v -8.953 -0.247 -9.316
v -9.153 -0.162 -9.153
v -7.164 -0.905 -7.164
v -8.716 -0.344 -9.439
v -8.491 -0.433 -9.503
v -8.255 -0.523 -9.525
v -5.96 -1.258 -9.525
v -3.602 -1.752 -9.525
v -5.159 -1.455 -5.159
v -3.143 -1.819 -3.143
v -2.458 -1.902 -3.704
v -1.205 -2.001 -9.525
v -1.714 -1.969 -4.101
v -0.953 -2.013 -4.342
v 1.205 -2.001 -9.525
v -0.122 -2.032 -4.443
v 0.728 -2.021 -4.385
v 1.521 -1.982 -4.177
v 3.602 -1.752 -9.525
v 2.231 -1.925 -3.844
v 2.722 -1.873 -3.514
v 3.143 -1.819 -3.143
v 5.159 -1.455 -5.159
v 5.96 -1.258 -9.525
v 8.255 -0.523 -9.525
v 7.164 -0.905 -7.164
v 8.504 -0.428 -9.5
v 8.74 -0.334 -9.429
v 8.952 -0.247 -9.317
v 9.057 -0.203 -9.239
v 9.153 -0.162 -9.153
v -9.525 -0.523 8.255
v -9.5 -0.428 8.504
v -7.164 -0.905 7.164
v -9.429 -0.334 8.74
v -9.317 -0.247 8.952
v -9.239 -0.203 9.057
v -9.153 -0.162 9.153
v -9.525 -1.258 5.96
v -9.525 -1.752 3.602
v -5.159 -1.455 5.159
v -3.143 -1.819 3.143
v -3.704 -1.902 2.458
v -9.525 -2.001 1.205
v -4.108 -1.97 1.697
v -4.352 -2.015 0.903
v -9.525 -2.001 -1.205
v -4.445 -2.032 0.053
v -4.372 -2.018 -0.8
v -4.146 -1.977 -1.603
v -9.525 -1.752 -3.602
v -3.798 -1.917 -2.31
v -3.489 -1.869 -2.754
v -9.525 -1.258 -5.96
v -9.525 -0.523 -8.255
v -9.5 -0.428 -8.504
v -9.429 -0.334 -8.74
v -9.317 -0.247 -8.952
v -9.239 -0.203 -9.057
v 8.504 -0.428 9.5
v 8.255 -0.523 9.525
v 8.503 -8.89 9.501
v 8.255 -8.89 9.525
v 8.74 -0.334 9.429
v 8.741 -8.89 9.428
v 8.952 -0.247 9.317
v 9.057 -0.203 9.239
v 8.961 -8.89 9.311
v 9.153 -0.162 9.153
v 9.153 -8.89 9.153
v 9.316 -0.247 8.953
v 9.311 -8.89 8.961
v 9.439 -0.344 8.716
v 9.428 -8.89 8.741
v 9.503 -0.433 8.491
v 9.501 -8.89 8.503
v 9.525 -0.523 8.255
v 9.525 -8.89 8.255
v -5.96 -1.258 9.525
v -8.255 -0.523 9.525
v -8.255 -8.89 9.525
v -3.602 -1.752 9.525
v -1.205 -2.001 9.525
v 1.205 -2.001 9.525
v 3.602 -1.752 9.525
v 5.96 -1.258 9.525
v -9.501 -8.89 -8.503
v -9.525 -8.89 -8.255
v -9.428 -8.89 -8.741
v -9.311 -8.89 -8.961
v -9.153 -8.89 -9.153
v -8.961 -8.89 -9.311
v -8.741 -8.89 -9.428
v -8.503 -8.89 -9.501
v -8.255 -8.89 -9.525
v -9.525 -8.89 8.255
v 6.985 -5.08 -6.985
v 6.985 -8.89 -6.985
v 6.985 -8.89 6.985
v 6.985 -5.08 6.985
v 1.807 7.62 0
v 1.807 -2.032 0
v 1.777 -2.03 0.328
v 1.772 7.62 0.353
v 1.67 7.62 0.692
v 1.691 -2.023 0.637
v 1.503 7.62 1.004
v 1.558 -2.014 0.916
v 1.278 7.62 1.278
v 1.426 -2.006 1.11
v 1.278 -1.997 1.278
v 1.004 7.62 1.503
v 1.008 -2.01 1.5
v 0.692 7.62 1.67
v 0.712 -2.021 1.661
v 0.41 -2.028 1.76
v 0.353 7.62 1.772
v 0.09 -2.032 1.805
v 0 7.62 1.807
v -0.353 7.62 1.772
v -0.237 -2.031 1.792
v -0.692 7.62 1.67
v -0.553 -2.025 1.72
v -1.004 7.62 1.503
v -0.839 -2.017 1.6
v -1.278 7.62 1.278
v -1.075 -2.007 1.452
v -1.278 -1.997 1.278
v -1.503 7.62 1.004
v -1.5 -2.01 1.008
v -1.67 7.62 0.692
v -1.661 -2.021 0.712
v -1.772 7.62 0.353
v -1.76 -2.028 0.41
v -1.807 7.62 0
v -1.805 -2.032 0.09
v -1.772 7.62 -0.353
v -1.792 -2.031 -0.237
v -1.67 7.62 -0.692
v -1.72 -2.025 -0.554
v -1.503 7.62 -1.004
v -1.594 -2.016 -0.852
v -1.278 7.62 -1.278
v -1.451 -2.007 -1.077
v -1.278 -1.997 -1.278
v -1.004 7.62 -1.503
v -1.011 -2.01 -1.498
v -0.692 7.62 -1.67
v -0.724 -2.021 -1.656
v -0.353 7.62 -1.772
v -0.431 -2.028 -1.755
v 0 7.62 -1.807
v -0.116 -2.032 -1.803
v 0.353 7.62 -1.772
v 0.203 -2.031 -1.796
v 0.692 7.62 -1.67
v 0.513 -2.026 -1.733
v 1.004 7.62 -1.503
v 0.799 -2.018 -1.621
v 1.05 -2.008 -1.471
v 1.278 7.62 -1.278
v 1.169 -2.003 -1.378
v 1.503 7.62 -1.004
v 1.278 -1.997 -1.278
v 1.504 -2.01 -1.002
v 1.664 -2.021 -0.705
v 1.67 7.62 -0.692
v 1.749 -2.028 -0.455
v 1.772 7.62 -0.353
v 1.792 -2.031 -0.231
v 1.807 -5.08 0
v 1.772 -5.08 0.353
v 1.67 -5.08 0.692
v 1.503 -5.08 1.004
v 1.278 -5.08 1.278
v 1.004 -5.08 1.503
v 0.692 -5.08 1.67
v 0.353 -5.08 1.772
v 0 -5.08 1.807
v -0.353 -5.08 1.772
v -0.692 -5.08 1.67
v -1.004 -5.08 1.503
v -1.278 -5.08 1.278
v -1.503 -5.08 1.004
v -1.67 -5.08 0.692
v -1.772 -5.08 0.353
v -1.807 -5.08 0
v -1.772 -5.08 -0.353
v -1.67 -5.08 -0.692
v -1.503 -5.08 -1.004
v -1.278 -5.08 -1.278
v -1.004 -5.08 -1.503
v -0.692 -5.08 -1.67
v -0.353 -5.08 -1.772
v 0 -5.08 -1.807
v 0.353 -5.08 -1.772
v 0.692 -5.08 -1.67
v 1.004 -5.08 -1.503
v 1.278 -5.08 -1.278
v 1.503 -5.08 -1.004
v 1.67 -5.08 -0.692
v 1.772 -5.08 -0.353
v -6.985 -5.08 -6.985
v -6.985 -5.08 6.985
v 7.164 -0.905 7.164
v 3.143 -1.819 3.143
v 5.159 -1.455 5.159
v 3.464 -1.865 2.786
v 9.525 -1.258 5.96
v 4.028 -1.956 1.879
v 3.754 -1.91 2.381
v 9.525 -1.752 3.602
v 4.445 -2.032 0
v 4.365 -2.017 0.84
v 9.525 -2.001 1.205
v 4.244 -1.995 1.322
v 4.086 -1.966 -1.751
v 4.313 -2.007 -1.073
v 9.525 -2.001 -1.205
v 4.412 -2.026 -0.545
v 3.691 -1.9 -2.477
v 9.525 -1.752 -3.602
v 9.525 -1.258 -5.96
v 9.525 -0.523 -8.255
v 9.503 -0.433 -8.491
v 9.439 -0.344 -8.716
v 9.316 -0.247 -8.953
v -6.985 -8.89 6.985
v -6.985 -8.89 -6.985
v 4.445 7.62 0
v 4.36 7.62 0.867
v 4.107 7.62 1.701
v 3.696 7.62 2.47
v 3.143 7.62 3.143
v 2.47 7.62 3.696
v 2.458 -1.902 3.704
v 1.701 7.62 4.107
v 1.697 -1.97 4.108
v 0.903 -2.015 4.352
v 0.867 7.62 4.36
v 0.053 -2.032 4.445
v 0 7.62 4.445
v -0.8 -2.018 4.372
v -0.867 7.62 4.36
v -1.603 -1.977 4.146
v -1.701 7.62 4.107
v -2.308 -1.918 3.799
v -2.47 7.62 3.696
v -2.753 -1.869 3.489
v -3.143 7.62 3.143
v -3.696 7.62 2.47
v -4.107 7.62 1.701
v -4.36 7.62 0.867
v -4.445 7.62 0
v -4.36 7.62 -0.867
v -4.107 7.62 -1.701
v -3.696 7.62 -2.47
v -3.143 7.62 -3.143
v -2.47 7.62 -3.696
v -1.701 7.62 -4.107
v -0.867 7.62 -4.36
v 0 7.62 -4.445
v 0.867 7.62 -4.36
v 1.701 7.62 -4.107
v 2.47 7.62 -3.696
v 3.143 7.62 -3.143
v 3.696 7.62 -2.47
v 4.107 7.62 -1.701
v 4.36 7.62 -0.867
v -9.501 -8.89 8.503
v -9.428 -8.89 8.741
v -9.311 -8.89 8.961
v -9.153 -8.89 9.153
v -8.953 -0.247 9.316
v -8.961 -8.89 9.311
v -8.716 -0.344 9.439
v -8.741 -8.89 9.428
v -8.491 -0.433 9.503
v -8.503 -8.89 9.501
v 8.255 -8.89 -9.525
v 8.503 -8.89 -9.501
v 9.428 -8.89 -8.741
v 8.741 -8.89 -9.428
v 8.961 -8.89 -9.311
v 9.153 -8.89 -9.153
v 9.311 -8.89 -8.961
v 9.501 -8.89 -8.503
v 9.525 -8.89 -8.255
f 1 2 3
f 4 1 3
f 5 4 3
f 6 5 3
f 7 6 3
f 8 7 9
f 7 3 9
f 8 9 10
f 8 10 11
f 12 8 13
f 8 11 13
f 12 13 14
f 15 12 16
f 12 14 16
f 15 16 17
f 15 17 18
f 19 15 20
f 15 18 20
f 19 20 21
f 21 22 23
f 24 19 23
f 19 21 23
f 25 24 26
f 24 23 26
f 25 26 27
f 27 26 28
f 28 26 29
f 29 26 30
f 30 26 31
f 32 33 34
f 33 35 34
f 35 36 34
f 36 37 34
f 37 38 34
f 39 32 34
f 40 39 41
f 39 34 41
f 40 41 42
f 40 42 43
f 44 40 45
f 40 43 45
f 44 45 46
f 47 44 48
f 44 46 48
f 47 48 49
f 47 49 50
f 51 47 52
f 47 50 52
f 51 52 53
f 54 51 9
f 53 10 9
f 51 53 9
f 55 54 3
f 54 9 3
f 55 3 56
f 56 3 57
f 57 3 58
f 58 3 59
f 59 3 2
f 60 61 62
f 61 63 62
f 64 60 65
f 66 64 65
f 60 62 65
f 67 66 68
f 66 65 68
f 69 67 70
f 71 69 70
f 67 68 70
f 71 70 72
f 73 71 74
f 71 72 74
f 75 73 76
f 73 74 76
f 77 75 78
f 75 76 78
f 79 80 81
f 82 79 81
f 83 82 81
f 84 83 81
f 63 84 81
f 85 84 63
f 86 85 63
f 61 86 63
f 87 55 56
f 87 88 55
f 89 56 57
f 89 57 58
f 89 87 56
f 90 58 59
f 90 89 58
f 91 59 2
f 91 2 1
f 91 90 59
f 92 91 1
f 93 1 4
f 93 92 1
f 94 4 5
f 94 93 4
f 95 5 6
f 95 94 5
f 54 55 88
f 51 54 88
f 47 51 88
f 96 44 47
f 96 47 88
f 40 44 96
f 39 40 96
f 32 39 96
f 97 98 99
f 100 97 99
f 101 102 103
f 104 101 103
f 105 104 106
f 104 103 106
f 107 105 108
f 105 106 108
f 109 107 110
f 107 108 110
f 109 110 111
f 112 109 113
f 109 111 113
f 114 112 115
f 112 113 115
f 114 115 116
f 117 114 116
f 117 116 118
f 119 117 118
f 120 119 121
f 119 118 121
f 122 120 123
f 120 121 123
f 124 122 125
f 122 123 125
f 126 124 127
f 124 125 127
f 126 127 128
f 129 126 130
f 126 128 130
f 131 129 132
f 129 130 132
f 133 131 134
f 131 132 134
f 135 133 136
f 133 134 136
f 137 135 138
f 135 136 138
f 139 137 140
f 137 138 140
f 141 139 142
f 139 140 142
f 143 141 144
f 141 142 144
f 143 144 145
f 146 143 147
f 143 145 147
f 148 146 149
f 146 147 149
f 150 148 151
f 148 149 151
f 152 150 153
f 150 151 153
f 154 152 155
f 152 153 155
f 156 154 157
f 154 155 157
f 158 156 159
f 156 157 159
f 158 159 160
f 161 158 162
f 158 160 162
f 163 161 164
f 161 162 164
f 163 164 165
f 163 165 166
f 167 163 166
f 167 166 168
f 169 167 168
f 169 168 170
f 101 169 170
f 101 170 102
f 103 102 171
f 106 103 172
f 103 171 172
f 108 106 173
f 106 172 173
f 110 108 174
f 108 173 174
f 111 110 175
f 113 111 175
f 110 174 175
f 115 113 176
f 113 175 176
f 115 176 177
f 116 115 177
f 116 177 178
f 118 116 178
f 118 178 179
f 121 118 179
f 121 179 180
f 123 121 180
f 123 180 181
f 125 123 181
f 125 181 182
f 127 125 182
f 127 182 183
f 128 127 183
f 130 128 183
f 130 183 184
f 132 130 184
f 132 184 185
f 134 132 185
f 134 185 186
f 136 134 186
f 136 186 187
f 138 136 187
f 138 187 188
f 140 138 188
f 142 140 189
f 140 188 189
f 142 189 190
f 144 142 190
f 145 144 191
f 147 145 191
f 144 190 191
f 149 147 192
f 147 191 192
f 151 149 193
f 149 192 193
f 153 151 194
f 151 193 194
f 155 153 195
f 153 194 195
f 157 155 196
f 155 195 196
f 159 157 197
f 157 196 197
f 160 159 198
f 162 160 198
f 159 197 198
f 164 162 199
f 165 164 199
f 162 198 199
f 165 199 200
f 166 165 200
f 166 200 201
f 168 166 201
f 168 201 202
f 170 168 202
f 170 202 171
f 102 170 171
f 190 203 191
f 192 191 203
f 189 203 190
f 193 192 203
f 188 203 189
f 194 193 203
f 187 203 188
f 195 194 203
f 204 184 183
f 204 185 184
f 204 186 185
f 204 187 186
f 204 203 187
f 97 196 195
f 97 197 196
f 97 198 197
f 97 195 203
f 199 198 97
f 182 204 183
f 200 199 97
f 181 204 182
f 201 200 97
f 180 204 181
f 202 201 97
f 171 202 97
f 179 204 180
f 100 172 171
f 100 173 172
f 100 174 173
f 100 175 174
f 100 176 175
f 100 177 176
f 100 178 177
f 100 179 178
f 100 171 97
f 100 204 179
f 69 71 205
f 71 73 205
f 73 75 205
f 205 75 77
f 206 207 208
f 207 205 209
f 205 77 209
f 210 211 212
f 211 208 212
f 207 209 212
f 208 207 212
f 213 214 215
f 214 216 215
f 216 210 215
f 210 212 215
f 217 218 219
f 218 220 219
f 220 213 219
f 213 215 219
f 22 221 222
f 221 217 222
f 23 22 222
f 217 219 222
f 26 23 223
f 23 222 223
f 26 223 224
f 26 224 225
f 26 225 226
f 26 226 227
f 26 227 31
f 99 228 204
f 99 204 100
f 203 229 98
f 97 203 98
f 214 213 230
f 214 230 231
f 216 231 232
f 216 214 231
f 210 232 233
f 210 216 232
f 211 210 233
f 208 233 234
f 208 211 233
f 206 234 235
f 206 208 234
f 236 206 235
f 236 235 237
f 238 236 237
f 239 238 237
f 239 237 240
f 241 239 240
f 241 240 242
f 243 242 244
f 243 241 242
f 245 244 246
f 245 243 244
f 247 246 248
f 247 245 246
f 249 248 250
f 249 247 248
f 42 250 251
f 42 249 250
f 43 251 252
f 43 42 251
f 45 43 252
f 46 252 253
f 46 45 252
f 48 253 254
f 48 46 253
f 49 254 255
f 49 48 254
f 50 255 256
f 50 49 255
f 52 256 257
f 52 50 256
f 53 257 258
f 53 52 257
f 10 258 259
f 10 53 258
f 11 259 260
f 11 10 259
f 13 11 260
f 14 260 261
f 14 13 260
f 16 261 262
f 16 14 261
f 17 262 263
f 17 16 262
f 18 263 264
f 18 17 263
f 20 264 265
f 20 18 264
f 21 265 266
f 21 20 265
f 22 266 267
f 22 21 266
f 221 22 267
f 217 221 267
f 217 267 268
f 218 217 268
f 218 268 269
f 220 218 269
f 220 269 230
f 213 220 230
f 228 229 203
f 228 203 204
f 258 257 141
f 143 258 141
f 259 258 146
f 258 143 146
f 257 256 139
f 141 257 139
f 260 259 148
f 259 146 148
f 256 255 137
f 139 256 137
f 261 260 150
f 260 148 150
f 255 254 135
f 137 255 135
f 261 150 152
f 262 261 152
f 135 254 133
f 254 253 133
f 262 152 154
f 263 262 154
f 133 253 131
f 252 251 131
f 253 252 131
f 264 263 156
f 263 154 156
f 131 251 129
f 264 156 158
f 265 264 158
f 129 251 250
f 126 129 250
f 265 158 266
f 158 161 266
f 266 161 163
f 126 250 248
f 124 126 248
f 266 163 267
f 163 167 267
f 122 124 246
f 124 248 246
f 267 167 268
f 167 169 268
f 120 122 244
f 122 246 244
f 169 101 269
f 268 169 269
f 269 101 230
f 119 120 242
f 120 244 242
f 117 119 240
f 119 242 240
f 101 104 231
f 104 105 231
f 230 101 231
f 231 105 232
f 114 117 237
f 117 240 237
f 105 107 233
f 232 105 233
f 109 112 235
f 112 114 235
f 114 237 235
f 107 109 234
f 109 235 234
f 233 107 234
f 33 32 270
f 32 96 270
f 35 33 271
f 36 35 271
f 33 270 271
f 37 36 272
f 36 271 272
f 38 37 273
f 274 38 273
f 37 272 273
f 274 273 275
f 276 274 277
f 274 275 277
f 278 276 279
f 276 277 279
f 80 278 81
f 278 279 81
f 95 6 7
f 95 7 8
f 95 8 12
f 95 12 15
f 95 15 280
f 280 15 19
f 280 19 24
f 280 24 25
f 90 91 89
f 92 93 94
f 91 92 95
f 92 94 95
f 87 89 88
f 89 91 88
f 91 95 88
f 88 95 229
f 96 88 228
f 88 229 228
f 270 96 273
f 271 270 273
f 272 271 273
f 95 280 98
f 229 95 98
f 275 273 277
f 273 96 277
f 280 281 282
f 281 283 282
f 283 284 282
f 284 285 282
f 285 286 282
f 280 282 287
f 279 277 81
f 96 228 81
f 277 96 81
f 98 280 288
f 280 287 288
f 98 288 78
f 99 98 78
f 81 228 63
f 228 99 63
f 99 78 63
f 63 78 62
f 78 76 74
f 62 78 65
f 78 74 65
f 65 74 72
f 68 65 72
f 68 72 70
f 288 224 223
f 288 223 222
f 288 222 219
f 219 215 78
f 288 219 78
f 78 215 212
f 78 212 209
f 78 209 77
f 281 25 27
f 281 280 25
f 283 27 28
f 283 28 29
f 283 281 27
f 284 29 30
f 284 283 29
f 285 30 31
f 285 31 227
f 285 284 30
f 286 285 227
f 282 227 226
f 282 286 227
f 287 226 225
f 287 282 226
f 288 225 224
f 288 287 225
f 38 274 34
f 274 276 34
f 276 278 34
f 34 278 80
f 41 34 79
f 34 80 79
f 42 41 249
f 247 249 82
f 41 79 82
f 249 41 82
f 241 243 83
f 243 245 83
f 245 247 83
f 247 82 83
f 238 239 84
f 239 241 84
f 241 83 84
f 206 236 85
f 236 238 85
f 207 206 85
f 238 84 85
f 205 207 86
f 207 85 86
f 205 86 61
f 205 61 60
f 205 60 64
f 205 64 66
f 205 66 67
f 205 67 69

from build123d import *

# Parameters (mm, degrees)
F0_W      = 19.05
F0_H      = 19.05
F1_DEPTH  = 11.43
F3_DEPTH  = 19.051
F5_DEPTH  = 19.051
F6_R      = 4.445
F6_R_2    = 1.807104104
F7_DEPTH  = 19.05
F8_DEPTH  = 19.0510001
F9_W      = 2.54
F9_H      = 19.05
F10_DEPTH = 19.0510001
F11_W     = 13.97
F11_H     = 13.97
F11_R     = 4.445
F12_DEPTH = 6.35
F13_R     = 1.27


with BuildPart() as f1:
    # F0 (on Front) → F1 (new body)
    with BuildSketch(Plane.XZ):
        Rectangle(F0_W, F0_H)
    extrude(amount=F1_DEPTH)

    # F2 (on face) → F3 (cut, through all)
    with BuildSketch(Plane.YZ.offset(9.525)):
        with BuildLine():
            Line((0, -9.525), (0, 9.525))
            ThreePointArc((0, 9.525), (-2.032, 0), (0, -9.525))
        make_face()
    extrude(amount=-F3_DEPTH, mode=Mode.SUBTRACT)

    # F4 (on face) → F5 (cut, through all)
    with BuildSketch(Plane.XY.offset(9.525)):
        with BuildLine():
            ThreePointArc((9.525, 0), (19.5841950931, 8.6107735797), (23.34021875, 21.30821875))
            ThreePointArc((23.34021875, 21.30821875), (-12.6974451703, 40.8924138431), (-9.525, 0))
            Line((-9.525, 0), (9.525, 0))
        make_face()
        with BuildLine():
            Line((9.525, 0), (-9.525, 0))
            ThreePointArc((-9.525, 0), (0, -2.032), (9.525, 0))
        make_face()
    extrude(amount=-F5_DEPTH, mode=Mode.SUBTRACT)

    # F6 (on face) → F7 (join)
    with BuildSketch(Plane.XZ.offset(11.43)):
        Circle(F6_R)
        Circle(F6_R_2, mode=Mode.SUBTRACT)
    extrude(amount=-F7_DEPTH)

    # F6 (on face) → F8 (cut, through all)
    with BuildSketch(Plane.XZ.offset(11.43)):
        Circle(F6_R_2)
    extrude(amount=-F8_DEPTH, mode=Mode.SUBTRACT)

    # F9 (on face) → F10 (cut, through all)
    with BuildSketch(Plane.YZ.offset(9.525)):
        with Locations((-10.16, 0)):
            Rectangle(F9_W, F9_H)
    extrude(amount=-F10_DEPTH, mode=Mode.SUBTRACT)

    # F11 (on face) + F6 (on face) → F12 (cut)
    with BuildSketch(Plane.XZ.offset(11.43)):
        Rectangle(F11_W, F11_H)
        Circle(F11_R, mode=Mode.SUBTRACT)
    with BuildSketch(Plane.XZ.offset(11.43)):
        Circle(F6_R)
        Circle(F6_R_2, mode=Mode.SUBTRACT)
    extrude(amount=-F12_DEPTH, mode=Mode.SUBTRACT)

    # F13
    f13_edges = [f1.edges().sort_by_distance(p)[0] for p in [
        (-9.525, -4.445, -9.525),
        (-9.525, -4.445, 9.525),
        (9.525, -4.445, 9.525),
        (9.525, -4.445, -9.525),
    ]]
    fillet(f13_edges, radius=F13_R)


solid = f1.part
